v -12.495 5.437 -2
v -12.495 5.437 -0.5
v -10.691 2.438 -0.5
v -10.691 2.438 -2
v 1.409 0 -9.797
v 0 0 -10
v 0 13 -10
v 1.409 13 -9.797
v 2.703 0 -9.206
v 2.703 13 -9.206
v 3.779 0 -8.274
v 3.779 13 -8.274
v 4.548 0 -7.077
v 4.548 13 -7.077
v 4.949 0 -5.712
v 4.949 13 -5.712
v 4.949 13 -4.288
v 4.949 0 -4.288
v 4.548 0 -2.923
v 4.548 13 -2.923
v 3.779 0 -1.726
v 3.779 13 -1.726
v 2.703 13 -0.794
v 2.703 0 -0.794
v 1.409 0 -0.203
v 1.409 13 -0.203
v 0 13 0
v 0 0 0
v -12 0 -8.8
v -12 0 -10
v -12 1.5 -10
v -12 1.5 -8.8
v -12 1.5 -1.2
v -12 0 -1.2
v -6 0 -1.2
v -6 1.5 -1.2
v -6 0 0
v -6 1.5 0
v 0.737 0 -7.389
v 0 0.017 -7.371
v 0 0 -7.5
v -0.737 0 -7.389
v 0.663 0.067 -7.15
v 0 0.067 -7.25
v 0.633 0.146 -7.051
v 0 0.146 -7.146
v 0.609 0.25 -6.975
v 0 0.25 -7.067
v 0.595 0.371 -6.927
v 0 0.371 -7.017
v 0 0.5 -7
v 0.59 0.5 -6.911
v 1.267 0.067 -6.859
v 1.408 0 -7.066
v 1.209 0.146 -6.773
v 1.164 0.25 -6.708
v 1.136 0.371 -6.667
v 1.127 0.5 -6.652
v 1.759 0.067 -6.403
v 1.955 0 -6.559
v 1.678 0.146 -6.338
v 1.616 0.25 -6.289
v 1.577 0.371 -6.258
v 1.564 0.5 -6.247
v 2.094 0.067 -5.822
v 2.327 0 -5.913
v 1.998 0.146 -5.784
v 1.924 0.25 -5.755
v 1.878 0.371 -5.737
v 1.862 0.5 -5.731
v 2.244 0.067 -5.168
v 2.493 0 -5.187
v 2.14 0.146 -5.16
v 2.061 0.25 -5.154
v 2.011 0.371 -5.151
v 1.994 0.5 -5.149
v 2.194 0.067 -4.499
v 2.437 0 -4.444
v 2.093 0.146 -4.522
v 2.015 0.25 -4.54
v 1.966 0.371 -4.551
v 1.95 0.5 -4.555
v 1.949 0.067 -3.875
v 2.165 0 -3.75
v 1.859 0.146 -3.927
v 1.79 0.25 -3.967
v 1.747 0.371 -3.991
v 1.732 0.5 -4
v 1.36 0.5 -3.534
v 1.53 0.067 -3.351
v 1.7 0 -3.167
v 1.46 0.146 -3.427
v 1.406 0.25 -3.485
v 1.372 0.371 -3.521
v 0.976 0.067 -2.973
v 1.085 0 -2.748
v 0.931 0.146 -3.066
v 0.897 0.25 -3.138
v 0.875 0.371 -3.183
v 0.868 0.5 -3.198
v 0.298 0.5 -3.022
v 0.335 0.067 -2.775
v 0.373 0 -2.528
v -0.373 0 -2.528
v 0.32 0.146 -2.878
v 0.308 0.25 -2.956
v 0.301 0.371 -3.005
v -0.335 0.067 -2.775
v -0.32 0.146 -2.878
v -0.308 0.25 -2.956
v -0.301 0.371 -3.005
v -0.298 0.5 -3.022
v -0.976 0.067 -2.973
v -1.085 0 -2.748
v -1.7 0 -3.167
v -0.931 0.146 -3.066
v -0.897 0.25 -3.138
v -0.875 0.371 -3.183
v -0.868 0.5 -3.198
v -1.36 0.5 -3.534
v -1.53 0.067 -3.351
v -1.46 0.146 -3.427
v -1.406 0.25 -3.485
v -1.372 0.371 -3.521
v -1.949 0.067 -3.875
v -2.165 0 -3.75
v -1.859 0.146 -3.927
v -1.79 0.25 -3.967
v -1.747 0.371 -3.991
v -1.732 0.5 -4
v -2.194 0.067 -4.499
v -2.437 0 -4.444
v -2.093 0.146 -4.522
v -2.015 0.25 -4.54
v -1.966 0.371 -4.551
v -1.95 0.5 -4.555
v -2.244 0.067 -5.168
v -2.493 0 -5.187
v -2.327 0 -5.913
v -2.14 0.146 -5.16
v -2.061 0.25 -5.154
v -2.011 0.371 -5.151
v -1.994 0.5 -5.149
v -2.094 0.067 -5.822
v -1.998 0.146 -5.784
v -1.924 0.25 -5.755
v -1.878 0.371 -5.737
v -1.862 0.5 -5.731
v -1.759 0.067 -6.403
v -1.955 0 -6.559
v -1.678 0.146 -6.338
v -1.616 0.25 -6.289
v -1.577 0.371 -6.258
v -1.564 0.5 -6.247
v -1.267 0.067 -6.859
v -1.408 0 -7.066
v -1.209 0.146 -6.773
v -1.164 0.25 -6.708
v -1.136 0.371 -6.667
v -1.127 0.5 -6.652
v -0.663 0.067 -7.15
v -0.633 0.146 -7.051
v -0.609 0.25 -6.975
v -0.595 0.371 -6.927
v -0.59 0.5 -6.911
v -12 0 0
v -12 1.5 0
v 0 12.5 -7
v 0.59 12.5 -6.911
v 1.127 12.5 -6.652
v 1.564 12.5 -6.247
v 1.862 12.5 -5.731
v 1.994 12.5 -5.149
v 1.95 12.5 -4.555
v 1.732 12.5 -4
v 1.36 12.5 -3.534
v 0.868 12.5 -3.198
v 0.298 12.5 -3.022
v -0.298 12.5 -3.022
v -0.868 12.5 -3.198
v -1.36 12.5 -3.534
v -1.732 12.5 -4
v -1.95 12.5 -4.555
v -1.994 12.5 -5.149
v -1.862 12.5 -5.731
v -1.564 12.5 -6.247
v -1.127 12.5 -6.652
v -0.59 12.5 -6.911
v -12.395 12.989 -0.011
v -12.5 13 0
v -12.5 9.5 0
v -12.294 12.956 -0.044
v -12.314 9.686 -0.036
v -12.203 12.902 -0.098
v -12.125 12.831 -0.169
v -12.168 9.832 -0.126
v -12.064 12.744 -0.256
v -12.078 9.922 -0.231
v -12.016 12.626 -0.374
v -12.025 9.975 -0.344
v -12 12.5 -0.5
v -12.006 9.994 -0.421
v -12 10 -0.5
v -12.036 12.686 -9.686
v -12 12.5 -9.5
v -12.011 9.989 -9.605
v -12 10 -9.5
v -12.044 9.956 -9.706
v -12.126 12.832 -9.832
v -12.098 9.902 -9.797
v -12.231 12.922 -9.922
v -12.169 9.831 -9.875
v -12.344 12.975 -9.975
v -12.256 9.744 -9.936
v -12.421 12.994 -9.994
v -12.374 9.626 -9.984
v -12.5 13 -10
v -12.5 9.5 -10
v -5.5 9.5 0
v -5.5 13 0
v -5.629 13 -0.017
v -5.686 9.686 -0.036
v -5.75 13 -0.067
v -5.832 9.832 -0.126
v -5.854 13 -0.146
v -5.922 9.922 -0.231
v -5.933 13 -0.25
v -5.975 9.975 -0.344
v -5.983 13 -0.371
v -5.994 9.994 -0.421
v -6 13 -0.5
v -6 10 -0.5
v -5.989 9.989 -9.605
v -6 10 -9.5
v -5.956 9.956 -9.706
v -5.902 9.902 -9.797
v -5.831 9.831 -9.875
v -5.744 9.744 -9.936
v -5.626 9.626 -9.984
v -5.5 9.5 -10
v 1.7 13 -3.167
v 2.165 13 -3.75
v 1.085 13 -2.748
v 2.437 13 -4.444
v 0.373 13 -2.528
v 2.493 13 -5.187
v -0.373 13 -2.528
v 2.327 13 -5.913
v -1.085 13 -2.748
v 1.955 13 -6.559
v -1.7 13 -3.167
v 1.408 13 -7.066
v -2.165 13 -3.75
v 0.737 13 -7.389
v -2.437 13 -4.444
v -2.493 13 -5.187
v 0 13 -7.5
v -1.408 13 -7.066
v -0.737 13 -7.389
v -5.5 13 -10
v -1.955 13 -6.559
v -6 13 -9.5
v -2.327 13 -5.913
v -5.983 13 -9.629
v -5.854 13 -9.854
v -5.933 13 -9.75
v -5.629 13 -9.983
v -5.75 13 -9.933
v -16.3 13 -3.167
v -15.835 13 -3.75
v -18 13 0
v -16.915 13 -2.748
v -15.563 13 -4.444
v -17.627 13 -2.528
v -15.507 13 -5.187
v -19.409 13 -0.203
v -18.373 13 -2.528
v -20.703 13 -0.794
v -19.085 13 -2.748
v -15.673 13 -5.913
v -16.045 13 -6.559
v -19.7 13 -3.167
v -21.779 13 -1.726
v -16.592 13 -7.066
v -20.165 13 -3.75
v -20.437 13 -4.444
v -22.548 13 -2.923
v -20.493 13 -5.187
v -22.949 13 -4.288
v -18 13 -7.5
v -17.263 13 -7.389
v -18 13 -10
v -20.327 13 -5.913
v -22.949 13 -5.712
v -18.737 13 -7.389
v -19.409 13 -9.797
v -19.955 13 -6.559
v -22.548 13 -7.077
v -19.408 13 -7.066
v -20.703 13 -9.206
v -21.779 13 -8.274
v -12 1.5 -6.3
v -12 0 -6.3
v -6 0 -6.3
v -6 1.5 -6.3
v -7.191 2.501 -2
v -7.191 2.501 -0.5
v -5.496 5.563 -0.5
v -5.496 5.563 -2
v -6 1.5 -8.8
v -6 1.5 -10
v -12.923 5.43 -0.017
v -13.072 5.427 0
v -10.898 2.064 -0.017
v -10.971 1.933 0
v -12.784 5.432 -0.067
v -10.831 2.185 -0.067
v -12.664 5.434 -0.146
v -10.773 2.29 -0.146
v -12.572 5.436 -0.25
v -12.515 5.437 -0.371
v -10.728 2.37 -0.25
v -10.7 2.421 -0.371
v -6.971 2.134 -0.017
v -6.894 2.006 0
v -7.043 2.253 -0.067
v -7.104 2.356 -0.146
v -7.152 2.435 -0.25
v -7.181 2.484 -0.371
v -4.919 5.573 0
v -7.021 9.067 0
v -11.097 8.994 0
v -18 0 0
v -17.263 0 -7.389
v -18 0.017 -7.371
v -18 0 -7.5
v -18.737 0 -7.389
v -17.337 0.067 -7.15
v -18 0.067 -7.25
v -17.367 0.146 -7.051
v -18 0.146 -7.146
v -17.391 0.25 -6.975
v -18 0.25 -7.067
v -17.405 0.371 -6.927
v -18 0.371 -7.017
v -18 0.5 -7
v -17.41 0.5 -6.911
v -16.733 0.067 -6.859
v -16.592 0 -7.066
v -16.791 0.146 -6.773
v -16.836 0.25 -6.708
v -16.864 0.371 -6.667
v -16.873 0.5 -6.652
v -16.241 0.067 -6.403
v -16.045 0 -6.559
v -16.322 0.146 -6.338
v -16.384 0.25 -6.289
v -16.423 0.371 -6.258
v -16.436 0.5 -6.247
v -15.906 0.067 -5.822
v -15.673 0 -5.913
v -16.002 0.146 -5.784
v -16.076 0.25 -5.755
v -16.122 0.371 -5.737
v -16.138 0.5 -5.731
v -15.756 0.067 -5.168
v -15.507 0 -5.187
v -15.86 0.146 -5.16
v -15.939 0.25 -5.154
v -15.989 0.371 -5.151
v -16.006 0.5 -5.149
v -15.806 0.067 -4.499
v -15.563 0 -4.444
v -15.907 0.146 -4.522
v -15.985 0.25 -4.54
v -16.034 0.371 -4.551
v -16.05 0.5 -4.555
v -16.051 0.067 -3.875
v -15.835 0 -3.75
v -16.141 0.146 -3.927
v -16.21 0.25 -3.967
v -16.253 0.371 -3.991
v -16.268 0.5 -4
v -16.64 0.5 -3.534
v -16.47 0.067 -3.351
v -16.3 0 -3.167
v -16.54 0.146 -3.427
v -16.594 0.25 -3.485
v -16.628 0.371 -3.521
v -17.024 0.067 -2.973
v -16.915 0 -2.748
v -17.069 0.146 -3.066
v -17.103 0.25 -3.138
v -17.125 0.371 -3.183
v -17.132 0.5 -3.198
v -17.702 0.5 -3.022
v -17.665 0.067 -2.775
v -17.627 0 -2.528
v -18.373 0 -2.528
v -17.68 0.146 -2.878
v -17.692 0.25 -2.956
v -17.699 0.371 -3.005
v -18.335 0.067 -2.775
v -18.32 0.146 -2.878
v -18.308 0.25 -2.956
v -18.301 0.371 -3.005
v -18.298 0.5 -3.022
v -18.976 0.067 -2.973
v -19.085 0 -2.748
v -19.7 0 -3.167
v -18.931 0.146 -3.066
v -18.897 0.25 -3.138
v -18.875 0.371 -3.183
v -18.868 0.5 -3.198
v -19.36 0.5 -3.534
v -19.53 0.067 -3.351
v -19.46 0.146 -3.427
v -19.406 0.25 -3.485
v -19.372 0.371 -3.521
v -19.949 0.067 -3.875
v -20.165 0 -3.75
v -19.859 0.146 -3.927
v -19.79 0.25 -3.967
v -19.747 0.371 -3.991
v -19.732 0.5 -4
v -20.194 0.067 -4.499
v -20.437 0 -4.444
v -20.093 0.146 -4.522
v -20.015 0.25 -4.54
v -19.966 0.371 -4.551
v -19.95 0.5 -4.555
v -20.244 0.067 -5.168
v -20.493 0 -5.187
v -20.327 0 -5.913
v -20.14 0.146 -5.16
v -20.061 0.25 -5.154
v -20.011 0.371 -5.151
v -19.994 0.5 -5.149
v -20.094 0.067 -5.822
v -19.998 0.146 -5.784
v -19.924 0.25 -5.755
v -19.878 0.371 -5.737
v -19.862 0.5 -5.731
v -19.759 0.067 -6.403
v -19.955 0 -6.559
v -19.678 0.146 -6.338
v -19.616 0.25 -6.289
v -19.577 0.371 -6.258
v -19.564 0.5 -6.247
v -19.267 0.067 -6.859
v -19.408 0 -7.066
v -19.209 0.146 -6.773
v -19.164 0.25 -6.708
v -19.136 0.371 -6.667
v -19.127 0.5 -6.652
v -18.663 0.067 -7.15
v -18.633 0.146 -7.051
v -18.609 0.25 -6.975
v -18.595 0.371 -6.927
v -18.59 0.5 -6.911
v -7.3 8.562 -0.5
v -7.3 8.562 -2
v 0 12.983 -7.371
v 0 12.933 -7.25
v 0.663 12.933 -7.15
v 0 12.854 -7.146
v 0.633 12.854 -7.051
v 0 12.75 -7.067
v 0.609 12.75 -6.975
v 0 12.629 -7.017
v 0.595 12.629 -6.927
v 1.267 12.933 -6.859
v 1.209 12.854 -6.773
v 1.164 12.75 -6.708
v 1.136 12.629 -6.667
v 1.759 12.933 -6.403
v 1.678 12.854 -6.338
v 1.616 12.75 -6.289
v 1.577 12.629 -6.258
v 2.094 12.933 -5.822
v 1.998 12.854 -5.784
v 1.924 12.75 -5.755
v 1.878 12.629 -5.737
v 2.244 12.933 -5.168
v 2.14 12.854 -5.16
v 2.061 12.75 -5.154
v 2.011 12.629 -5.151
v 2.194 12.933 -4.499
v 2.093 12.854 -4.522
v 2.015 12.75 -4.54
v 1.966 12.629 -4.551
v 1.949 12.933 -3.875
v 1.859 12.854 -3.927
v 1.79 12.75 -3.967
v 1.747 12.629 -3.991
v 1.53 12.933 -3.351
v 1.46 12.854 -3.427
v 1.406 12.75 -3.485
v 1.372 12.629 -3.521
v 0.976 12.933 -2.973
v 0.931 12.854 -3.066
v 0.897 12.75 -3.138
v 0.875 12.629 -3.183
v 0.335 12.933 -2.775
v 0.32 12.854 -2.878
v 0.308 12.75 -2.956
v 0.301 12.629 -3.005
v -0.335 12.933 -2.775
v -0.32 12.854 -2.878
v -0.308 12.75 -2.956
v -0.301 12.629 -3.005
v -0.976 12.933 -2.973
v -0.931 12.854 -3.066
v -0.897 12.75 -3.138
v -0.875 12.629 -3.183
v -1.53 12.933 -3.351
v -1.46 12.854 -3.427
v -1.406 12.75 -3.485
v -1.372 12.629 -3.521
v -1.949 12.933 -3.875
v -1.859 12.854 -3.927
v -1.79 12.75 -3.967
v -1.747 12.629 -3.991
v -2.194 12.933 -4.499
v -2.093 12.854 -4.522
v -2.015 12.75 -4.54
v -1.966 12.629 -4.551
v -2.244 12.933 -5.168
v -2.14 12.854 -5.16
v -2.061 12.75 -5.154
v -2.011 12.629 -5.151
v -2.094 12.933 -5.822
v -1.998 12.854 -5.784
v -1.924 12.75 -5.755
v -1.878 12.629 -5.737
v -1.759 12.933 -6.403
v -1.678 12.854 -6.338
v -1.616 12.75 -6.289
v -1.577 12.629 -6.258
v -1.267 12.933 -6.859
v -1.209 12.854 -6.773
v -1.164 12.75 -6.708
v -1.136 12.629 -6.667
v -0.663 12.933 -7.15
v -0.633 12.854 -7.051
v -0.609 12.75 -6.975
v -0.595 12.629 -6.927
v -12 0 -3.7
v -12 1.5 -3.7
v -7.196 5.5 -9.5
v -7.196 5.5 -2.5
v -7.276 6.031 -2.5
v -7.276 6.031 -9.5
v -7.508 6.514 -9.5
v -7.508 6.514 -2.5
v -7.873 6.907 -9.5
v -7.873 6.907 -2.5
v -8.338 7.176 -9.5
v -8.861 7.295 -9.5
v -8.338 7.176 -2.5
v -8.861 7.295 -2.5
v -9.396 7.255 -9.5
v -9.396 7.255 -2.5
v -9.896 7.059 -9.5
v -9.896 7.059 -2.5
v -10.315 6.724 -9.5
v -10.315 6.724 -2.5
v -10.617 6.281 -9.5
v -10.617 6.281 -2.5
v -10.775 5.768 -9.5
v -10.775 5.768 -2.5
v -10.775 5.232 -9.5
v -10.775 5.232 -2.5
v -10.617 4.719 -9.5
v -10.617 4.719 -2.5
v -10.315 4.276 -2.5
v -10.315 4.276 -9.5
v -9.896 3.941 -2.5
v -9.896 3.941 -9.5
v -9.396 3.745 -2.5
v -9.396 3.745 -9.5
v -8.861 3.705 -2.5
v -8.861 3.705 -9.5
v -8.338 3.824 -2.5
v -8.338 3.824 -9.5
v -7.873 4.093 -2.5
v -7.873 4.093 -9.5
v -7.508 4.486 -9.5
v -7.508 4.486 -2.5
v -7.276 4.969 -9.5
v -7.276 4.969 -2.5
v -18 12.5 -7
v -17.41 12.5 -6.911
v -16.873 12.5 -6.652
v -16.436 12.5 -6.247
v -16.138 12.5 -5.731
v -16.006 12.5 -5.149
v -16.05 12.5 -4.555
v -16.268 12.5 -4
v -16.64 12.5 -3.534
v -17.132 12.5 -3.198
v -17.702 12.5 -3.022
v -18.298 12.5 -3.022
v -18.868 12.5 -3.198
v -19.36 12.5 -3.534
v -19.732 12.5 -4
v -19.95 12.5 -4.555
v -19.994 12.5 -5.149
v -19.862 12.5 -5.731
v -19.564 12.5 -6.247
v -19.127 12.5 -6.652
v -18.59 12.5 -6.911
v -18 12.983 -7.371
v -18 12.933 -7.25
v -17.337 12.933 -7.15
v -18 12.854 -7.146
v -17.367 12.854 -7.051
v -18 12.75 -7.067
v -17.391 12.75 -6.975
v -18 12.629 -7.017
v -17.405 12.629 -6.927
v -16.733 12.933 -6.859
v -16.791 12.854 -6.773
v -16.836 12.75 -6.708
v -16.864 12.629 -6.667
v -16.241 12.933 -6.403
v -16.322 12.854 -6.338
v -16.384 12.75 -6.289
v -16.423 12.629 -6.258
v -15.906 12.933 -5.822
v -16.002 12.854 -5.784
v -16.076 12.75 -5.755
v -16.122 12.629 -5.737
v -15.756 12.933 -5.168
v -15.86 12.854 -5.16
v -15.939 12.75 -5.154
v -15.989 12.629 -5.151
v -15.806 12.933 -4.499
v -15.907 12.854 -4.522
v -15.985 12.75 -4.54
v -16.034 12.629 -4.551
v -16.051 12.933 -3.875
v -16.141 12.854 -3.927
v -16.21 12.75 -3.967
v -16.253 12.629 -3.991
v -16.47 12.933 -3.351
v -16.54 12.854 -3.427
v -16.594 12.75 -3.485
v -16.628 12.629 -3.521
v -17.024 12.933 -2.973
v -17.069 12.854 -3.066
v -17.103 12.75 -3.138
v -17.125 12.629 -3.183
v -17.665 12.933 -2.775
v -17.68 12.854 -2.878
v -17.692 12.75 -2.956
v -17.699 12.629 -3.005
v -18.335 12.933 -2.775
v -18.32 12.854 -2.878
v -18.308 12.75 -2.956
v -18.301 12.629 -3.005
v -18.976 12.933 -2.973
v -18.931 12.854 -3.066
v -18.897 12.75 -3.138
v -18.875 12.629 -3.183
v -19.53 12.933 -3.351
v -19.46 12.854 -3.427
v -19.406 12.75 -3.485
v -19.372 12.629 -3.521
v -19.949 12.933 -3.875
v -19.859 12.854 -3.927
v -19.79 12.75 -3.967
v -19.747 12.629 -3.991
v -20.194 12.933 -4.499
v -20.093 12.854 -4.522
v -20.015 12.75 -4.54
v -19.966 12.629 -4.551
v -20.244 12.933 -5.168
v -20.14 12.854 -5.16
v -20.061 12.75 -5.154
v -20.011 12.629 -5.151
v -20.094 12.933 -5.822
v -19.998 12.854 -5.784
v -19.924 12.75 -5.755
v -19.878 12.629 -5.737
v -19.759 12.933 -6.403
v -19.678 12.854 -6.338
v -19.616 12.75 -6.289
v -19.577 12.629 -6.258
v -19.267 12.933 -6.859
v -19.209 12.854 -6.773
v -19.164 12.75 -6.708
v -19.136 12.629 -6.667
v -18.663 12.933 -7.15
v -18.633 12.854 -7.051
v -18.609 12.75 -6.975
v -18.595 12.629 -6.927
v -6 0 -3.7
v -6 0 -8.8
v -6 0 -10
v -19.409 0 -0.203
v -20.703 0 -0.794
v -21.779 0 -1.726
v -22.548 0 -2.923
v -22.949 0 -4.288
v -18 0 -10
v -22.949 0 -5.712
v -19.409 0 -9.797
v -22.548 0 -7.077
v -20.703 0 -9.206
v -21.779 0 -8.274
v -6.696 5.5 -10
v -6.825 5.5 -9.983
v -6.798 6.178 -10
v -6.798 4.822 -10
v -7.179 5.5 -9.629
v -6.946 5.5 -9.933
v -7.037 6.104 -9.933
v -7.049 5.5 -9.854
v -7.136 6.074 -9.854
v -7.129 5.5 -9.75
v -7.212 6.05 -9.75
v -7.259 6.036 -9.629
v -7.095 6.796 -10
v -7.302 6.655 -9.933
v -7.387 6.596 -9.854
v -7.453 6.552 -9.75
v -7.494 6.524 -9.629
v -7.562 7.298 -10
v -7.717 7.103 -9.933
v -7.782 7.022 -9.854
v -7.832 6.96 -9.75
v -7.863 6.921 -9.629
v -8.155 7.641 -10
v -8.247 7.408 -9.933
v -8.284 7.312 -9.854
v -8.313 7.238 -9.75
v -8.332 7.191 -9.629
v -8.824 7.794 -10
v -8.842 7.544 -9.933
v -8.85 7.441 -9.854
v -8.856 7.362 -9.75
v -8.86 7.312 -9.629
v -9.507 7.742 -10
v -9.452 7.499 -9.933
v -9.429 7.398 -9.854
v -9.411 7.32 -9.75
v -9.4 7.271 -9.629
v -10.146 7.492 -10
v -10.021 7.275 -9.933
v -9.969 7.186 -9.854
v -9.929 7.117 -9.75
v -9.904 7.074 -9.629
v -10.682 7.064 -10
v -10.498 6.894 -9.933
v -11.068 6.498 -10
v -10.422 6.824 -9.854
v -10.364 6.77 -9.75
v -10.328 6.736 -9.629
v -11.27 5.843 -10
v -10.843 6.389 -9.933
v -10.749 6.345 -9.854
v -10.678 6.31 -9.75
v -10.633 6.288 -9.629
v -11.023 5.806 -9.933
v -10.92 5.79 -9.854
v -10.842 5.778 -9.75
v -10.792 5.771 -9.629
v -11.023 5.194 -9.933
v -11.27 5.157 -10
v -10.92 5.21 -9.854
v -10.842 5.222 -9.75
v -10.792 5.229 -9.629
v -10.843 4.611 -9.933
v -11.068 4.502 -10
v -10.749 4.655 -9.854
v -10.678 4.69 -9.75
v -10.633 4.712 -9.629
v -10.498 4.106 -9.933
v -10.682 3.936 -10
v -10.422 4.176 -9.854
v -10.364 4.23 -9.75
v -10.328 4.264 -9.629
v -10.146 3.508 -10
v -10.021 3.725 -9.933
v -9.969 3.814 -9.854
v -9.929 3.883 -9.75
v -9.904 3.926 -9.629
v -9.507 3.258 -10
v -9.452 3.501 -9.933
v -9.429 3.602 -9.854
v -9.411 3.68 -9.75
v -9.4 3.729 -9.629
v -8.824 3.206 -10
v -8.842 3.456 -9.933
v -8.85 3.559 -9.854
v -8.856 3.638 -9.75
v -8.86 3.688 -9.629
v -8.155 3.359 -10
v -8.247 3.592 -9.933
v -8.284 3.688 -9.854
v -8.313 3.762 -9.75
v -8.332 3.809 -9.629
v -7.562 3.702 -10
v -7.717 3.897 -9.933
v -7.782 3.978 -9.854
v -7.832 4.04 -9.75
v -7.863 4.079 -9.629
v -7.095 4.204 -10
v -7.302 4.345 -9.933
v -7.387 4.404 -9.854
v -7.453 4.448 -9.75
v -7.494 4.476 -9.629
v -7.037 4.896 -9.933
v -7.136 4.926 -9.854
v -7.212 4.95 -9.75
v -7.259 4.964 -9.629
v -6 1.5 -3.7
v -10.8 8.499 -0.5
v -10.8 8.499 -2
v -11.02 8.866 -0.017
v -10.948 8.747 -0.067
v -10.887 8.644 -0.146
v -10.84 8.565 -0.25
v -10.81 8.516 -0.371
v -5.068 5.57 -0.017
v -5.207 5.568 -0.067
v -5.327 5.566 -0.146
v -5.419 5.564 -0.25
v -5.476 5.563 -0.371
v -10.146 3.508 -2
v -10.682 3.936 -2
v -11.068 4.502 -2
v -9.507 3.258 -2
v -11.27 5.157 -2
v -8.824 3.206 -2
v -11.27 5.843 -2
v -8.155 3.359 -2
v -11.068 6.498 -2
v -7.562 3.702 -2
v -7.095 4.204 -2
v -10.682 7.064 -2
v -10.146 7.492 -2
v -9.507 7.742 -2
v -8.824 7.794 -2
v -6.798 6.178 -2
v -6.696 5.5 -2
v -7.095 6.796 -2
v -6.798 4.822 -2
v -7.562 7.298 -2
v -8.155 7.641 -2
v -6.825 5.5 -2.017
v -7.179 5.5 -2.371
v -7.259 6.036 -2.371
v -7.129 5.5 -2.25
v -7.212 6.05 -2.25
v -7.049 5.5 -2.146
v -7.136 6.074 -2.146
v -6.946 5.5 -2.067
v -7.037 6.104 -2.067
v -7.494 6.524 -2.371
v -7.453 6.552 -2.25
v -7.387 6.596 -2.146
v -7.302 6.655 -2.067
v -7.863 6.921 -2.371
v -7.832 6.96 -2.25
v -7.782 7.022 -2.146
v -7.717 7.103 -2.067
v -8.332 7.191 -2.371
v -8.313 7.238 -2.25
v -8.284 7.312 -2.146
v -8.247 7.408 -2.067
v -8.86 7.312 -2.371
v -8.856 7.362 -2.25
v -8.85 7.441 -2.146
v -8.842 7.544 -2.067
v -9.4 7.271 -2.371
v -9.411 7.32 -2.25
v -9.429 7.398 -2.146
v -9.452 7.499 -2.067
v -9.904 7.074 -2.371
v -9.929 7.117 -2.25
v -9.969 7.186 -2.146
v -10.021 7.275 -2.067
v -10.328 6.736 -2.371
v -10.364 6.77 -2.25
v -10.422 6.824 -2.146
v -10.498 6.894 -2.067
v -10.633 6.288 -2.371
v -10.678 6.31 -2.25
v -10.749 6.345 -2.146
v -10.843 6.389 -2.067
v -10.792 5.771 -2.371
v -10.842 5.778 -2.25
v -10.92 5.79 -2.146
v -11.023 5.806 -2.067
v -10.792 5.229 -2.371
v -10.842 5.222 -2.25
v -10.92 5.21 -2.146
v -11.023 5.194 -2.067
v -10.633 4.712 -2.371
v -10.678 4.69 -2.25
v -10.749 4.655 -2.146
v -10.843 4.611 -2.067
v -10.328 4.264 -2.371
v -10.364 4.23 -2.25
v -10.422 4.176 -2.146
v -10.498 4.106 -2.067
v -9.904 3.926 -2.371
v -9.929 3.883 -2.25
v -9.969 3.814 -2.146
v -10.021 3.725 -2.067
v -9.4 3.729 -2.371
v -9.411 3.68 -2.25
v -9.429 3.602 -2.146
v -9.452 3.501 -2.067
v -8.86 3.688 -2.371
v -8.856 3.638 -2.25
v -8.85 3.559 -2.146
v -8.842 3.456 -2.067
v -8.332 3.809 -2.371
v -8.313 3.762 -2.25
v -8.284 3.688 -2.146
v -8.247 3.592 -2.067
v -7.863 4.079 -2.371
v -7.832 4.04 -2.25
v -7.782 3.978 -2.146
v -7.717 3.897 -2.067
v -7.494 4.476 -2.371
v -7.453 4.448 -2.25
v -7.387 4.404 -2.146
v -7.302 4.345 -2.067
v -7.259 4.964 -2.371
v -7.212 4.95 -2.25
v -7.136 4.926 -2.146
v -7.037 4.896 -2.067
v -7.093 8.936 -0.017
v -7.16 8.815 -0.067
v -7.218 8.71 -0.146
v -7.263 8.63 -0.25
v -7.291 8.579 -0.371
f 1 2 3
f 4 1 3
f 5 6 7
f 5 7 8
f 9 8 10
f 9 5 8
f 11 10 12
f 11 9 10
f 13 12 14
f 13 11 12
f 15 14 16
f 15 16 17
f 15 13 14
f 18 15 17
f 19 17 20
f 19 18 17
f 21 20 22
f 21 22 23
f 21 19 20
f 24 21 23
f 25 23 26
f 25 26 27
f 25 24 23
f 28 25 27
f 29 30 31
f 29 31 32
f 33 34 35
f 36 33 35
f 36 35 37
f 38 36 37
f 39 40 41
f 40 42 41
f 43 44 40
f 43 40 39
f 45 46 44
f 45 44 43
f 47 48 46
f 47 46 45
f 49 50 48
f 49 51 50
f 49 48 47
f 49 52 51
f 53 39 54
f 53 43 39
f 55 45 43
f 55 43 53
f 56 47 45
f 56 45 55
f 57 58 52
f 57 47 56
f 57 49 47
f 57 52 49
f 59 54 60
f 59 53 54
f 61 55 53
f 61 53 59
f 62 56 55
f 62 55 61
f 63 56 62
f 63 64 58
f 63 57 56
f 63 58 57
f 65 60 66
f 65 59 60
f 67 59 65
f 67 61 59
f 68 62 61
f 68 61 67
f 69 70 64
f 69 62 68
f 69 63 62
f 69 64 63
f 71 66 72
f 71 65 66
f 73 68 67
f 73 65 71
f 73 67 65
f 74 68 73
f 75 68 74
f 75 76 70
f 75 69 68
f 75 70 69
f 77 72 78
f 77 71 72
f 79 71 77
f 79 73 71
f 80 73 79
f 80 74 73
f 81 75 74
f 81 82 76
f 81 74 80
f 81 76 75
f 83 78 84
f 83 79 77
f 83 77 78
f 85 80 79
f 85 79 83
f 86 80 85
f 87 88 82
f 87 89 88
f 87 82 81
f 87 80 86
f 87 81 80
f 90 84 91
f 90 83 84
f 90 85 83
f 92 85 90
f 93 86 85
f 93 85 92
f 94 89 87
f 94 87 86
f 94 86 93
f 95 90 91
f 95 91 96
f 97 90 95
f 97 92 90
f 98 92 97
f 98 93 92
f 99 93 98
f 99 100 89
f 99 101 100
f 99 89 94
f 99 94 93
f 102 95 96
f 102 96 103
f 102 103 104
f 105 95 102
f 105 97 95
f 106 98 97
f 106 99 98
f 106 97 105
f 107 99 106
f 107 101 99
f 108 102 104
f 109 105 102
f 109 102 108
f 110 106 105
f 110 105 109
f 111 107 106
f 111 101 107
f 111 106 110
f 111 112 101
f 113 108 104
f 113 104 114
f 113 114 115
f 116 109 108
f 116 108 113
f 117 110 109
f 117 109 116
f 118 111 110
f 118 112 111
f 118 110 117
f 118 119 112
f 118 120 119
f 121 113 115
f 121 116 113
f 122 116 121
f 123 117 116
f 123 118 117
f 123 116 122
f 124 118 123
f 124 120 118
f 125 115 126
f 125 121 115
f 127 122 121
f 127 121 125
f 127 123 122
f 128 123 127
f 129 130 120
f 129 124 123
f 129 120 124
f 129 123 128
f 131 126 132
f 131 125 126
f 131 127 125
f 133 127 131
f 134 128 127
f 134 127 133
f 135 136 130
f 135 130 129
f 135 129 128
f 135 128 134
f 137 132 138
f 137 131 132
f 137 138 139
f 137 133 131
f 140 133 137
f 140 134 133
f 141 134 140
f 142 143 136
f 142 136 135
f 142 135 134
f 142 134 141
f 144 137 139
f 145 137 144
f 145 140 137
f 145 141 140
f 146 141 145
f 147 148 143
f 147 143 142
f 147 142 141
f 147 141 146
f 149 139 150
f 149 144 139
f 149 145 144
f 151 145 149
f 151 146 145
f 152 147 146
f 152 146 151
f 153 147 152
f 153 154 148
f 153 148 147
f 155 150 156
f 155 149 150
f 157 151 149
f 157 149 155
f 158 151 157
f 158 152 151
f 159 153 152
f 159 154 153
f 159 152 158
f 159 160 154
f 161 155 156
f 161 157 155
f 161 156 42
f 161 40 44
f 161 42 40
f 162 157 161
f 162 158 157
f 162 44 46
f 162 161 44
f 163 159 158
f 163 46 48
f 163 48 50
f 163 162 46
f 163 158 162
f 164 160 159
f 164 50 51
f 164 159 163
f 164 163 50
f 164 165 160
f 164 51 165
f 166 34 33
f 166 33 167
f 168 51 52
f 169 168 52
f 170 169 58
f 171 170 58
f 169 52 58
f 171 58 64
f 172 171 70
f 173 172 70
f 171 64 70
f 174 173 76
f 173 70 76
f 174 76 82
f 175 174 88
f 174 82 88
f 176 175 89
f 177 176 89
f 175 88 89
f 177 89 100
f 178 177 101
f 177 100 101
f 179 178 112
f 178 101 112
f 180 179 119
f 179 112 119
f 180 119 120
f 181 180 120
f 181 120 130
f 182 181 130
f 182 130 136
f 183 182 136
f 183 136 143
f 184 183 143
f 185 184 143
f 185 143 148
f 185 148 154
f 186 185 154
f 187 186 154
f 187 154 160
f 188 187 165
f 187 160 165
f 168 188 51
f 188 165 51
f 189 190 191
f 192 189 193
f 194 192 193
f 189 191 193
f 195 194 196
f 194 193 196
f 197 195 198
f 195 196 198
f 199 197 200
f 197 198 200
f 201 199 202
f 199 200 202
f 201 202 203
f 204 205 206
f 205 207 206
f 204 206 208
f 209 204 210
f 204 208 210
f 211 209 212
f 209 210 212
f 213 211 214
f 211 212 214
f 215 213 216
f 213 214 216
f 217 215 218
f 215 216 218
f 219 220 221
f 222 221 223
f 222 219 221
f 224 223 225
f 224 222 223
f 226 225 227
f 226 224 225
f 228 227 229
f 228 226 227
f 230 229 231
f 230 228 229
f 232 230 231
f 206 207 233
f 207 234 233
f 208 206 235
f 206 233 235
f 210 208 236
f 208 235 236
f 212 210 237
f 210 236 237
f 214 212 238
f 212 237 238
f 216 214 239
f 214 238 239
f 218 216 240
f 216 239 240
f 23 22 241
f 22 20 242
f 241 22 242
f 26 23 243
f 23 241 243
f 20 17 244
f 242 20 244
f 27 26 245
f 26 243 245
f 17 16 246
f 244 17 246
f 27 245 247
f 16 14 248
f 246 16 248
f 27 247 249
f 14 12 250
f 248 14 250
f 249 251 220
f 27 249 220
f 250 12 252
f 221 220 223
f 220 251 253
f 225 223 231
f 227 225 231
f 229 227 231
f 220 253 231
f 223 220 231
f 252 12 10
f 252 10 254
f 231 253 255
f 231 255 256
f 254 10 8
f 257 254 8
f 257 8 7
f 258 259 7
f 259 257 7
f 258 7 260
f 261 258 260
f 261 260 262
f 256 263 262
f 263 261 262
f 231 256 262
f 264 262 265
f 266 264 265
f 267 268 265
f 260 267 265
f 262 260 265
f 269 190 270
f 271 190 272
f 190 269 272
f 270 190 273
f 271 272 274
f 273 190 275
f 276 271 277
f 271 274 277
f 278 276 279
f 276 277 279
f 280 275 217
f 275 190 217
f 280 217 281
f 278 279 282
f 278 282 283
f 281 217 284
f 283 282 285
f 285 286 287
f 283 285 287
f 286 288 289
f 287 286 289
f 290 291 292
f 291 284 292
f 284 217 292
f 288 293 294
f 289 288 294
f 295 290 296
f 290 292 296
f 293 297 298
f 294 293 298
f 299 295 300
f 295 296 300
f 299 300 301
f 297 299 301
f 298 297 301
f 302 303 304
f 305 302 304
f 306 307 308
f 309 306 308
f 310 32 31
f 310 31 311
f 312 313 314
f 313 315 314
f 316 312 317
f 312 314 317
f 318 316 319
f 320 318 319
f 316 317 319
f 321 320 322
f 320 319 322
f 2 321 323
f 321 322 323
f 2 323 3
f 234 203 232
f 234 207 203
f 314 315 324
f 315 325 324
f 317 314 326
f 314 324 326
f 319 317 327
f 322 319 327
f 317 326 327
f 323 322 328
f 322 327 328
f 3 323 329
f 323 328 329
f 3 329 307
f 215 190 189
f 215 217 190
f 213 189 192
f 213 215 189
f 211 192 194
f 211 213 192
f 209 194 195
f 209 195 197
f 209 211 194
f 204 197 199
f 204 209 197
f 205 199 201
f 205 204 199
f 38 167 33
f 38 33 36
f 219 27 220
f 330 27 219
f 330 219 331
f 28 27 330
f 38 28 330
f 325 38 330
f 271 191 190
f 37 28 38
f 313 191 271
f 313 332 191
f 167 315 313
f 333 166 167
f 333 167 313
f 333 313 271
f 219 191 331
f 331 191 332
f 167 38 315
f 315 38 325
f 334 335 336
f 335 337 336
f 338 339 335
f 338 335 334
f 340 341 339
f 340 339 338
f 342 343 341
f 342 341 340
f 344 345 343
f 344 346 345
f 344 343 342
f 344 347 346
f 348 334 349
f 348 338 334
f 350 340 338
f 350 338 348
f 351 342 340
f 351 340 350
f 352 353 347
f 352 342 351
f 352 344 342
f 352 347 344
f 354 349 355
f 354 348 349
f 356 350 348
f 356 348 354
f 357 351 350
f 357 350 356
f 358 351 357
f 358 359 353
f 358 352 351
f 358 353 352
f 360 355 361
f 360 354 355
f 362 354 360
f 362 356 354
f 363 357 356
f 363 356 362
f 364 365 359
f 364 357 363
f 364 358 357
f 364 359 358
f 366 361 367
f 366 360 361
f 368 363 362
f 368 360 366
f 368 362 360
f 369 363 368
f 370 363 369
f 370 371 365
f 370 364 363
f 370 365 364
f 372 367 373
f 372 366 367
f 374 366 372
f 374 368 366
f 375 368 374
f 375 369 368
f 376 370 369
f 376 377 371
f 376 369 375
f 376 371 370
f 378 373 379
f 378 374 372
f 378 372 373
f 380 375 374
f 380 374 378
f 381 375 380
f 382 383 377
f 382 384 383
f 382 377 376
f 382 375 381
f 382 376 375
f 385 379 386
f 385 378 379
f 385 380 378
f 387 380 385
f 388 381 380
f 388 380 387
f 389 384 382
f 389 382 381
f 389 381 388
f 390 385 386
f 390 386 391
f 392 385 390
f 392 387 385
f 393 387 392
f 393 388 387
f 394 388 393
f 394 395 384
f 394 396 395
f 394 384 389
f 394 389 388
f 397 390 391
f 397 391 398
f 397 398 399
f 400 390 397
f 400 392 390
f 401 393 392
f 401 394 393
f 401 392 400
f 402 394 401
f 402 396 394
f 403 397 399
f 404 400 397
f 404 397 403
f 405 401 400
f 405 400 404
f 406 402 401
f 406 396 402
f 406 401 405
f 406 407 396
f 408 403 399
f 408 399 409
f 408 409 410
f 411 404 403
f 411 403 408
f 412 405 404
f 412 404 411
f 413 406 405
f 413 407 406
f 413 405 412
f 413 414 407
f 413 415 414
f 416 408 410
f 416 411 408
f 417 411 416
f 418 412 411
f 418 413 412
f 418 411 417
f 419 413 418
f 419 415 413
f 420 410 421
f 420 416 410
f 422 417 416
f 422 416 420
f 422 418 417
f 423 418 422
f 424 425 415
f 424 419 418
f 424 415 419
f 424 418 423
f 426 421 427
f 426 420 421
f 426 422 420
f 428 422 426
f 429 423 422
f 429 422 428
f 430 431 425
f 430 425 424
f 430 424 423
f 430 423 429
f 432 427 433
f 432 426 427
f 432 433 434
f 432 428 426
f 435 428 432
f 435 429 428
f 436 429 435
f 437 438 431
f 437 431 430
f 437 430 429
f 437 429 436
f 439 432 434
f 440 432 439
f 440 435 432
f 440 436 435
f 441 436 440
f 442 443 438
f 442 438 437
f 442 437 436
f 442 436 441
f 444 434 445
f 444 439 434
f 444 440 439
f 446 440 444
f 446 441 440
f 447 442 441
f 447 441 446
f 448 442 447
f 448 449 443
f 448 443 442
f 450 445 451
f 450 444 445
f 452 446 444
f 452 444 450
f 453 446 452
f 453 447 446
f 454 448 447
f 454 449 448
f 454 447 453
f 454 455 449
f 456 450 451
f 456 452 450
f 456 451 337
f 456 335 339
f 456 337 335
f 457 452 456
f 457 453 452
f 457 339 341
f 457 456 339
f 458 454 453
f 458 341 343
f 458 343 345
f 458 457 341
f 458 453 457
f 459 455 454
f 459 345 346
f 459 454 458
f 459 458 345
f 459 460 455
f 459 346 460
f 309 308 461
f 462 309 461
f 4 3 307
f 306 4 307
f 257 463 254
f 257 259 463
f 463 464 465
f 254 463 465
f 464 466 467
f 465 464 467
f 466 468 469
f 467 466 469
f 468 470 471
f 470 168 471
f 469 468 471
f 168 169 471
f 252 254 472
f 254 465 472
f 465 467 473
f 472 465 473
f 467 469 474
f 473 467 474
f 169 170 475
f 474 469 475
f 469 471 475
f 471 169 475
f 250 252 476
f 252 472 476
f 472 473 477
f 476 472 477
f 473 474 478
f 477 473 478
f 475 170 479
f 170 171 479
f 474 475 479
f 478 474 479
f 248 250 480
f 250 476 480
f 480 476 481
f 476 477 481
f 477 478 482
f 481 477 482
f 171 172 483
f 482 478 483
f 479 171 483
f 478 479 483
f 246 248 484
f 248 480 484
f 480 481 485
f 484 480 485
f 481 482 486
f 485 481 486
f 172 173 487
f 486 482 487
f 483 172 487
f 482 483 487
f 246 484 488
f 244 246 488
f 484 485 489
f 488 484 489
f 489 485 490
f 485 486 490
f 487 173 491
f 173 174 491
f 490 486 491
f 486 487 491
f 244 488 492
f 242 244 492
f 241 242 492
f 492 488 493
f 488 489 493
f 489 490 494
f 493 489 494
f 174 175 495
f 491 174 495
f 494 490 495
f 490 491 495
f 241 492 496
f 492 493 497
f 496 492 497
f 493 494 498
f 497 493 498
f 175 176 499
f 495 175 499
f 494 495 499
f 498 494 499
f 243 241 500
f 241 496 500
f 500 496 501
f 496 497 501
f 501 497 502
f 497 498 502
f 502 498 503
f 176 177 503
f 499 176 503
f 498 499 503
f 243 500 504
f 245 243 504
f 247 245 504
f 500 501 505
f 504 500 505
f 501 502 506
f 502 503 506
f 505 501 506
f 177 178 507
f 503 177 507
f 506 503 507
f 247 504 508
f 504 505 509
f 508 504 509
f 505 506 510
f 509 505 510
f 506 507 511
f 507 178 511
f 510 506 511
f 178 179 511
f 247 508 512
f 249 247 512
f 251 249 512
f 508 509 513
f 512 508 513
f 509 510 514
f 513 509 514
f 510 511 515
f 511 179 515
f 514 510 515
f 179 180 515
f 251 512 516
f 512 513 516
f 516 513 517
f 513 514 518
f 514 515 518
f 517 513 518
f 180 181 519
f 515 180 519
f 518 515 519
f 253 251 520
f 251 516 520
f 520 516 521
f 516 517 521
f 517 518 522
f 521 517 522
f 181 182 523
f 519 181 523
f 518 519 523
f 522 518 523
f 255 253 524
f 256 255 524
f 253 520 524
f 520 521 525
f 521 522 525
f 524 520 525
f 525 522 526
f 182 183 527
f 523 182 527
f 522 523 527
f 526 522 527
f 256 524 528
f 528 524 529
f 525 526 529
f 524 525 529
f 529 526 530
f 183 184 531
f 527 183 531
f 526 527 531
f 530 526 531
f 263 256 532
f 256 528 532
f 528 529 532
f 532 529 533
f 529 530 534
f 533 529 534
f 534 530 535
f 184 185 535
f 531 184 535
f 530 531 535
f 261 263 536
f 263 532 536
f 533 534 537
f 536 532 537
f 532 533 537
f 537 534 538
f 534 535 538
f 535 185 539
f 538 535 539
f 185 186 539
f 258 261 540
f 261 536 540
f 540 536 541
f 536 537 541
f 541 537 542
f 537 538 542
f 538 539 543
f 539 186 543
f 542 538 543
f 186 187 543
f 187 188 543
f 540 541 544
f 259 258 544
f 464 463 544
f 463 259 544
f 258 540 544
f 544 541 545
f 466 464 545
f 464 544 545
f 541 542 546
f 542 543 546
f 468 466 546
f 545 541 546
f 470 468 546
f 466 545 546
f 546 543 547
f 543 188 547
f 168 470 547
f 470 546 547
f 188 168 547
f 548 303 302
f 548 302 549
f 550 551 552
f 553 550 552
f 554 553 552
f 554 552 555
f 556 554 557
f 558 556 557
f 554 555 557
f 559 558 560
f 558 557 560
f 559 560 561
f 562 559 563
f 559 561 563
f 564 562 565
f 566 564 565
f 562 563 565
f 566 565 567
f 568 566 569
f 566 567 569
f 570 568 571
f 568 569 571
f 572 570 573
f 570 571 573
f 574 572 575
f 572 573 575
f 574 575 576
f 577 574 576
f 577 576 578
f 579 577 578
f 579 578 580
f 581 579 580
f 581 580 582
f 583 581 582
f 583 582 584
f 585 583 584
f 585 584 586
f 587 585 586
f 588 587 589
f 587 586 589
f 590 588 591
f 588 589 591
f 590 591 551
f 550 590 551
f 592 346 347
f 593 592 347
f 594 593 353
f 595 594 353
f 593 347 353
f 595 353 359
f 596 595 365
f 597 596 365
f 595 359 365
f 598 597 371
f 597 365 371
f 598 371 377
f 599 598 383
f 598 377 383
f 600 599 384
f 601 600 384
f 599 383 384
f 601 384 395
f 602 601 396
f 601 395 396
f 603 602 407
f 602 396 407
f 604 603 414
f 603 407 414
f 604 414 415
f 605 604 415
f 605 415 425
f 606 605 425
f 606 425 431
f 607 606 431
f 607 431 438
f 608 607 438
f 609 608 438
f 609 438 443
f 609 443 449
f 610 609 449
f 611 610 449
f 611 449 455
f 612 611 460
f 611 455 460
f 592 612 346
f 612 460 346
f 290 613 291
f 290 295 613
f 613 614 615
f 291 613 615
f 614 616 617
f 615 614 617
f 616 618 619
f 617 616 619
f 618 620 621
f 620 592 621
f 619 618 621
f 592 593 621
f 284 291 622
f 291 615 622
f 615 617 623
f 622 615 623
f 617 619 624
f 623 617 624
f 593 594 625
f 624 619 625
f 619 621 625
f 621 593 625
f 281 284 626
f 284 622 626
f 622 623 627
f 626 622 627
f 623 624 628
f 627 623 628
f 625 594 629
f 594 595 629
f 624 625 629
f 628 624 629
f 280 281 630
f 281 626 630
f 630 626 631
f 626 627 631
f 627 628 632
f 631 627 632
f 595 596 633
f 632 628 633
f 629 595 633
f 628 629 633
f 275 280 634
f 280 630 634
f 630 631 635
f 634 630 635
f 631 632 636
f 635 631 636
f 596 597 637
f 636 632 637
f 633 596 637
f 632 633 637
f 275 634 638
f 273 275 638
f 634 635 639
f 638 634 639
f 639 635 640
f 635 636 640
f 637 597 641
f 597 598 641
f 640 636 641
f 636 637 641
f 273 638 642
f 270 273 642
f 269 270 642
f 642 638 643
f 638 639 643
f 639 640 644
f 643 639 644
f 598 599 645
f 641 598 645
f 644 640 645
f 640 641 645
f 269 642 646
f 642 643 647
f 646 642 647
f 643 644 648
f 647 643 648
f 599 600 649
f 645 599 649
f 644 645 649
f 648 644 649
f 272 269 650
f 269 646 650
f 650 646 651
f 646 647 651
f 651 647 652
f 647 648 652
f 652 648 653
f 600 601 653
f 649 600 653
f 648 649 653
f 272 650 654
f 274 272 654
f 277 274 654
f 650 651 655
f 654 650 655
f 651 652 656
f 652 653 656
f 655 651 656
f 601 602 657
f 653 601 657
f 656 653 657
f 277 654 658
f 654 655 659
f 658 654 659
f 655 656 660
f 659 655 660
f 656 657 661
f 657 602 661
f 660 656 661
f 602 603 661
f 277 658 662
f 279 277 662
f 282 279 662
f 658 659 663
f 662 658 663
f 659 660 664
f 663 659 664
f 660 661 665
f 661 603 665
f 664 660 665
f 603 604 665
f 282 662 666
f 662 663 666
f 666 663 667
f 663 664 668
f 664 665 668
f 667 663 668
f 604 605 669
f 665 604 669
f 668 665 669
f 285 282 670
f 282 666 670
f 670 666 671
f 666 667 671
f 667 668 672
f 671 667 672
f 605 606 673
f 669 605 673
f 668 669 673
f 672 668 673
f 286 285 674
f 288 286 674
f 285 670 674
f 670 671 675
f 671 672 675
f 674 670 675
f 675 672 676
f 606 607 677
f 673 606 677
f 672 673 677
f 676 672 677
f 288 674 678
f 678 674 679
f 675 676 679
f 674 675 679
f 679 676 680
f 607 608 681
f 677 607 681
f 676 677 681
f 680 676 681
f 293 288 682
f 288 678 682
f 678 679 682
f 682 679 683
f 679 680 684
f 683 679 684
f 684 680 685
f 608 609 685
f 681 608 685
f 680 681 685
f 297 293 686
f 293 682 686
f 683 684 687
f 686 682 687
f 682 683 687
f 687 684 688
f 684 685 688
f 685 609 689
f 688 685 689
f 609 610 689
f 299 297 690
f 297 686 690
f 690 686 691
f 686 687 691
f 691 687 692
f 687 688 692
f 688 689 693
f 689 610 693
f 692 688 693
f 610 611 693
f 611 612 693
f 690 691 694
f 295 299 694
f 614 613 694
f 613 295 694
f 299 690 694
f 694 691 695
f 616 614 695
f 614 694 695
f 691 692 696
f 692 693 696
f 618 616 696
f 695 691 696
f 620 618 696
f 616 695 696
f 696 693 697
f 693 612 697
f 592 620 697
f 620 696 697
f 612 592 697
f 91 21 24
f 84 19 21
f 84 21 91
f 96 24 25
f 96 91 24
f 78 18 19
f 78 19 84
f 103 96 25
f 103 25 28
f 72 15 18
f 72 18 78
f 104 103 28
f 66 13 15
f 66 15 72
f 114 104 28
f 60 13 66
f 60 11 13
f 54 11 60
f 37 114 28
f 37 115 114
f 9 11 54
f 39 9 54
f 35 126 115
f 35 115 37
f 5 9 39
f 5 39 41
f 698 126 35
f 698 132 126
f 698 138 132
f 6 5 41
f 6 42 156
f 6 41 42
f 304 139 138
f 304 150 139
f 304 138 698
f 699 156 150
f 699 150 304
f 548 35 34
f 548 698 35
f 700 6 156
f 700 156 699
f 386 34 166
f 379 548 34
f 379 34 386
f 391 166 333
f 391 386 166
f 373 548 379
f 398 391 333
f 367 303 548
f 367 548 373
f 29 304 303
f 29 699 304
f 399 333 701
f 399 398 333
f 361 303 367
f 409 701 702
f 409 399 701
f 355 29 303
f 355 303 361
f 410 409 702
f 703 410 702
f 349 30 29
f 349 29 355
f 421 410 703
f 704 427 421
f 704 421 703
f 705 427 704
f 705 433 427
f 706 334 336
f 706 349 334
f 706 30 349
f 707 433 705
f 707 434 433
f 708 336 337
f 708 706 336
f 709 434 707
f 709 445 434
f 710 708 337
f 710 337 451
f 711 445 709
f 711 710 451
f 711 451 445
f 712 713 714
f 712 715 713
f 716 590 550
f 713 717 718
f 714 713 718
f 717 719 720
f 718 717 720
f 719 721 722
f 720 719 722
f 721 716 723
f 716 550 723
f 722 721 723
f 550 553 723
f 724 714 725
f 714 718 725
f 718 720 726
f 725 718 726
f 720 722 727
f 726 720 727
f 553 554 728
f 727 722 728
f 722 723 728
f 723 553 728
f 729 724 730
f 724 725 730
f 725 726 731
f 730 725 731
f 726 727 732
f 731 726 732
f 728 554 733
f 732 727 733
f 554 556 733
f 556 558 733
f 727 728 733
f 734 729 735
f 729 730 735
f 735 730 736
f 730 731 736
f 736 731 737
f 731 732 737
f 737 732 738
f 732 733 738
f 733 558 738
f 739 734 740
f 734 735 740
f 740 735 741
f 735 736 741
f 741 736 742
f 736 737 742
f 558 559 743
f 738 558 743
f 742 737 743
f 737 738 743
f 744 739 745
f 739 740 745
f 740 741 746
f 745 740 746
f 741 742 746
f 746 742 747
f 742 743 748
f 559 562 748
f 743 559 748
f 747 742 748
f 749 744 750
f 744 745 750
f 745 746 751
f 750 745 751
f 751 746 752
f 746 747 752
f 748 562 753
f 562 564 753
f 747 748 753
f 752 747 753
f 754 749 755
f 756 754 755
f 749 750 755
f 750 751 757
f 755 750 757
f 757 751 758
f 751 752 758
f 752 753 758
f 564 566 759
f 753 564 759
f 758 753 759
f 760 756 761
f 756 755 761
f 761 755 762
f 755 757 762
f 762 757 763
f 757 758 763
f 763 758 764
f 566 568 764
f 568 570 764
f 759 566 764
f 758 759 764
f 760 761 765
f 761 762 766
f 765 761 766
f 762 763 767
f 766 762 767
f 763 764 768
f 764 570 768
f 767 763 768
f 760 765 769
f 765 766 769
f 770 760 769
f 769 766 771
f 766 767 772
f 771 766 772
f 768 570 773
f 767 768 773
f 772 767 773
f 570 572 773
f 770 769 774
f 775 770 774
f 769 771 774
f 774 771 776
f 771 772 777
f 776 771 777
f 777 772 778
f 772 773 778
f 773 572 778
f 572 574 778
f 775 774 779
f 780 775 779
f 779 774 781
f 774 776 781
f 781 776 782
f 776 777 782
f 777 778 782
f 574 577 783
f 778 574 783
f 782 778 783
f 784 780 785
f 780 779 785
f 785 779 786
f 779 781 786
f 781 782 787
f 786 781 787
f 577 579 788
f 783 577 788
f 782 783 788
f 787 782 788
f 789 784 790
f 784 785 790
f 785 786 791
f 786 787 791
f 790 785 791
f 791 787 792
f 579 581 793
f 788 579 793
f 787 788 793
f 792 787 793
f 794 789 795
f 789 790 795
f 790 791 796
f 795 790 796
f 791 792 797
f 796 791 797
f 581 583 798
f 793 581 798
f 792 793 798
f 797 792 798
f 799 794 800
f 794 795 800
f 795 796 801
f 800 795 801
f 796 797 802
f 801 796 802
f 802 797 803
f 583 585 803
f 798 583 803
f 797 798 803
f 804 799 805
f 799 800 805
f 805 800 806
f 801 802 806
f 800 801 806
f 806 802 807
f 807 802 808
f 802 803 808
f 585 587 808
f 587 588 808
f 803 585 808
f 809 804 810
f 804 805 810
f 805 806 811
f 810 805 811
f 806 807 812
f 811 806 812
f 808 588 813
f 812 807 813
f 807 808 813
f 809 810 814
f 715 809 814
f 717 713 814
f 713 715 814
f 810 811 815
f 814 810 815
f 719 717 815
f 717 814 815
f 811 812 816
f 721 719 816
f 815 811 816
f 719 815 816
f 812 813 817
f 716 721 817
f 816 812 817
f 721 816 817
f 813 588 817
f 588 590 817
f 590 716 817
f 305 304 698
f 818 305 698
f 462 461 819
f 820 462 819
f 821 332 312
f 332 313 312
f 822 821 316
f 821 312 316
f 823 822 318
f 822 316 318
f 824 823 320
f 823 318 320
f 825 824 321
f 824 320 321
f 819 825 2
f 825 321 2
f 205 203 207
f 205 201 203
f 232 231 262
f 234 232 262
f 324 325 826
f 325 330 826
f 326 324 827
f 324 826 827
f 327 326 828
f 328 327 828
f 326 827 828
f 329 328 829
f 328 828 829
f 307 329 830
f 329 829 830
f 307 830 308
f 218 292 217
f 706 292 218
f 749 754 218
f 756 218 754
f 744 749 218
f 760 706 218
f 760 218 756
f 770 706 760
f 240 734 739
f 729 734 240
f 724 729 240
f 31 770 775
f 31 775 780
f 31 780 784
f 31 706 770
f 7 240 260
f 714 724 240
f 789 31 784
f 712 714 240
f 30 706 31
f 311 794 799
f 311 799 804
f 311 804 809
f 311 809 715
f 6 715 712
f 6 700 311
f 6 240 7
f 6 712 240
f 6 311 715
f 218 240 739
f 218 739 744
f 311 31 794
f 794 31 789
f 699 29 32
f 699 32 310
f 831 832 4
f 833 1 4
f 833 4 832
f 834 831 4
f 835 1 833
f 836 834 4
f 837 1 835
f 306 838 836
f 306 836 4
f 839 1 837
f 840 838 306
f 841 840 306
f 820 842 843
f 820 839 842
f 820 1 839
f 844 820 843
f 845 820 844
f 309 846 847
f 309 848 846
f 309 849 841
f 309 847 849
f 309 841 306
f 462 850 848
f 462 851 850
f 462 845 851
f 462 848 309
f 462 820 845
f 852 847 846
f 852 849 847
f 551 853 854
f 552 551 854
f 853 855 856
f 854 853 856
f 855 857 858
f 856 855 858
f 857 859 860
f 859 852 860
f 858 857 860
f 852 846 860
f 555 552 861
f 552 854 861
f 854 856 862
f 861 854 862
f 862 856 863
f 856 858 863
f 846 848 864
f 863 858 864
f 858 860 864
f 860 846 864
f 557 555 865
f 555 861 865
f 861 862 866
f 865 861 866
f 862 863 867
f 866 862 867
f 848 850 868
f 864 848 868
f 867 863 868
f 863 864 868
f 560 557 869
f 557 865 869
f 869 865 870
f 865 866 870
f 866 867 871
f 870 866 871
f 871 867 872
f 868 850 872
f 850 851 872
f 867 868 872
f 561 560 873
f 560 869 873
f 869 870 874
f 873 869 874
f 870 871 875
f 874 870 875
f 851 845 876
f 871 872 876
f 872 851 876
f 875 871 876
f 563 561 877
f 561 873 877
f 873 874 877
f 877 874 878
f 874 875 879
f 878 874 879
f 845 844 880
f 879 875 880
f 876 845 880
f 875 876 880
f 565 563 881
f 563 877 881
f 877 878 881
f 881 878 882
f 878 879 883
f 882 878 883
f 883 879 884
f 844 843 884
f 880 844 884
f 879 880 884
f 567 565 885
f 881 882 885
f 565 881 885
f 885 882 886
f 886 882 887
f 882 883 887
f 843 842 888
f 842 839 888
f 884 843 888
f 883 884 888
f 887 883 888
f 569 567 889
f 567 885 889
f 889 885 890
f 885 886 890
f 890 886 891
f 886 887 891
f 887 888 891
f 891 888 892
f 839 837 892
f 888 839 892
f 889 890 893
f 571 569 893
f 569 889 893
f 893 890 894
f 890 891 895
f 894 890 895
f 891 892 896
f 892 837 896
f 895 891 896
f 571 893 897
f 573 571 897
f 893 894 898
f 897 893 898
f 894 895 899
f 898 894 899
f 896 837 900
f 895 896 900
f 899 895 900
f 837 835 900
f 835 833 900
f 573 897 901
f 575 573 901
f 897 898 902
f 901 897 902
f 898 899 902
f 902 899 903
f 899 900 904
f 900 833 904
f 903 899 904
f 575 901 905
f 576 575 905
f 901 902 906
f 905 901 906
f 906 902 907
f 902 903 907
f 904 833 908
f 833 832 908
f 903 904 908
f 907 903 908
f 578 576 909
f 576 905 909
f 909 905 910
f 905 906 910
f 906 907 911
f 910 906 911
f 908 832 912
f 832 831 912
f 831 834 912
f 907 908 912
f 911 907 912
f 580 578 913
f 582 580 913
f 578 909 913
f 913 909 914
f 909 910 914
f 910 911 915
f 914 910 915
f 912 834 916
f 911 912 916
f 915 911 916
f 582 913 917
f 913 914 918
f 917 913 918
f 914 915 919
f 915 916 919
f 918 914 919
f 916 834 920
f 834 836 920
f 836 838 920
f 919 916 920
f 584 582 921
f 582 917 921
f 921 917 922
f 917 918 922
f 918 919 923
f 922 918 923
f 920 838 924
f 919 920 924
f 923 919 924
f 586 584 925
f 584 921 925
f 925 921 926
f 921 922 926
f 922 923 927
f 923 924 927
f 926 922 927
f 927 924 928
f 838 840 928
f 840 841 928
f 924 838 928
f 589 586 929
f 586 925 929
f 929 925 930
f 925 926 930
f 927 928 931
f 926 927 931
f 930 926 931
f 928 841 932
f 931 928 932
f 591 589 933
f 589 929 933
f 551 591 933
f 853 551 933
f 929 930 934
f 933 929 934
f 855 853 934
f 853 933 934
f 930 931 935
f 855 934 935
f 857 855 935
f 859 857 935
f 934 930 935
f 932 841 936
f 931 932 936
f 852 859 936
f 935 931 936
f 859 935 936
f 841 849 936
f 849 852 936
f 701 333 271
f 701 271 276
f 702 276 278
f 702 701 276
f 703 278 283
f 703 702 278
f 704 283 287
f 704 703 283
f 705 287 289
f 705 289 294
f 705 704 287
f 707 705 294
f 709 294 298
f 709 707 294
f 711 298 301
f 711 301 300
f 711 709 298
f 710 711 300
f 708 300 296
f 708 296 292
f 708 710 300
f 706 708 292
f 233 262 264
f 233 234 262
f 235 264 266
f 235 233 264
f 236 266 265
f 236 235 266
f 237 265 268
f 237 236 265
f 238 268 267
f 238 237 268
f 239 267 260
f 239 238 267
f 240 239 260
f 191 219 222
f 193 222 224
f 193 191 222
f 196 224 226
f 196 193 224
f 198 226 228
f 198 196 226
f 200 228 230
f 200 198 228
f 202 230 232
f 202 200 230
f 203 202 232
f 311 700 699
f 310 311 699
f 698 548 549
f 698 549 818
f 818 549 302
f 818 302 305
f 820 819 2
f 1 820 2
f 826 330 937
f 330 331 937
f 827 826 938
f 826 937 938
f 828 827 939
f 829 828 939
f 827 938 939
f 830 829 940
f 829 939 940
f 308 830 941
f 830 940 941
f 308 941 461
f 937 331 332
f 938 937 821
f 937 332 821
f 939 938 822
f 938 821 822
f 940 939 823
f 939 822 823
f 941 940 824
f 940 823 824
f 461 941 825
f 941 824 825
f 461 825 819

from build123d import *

# Parameters (mm, degrees)
BOSS_EXTRUDE2_DEPTH = 13
SCREW_HOLES_R       = 2
CUT_EXTRUDE1_DEPTH  = 13
FILLET1_R           = 0.5
BELT_OPENING_W      = 6
BELT_OPENING_H      = 10
CUT_EXTRUDE2_DEPTH  = 3
CUT_EXTRUDE3_DEPTH  = 2
STRETCHER_HOLE_R    = 1.8
CUT_EXTRUDE4_DEPTH  = 8
FILLET2_R           = 0.5
FILLET3_R           = 0.5
FILLET8_R           = 0.5
FILLET9_R           = 0.5
SKETCH1_W           = 6
SKETCH1_H           = 2.4
SKETCH1_H_2         = 2.6
CUT_EXTRUDE5_DEPTH  = 1.5


with BuildPart() as part:
    # Belt Clamp → Boss-Extrude2 (new body)
    with BuildSketch(Plane(origin=(0, 0, 0), x_dir=(1, 0, 0), z_dir=(0, 1, 0))):
        with BuildLine():
            Line((-18, 10), (0, 10))
            ThreePointArc((0, 10), (5, 5), (0, 0))
            Line((0, 0), (-18, 0))
            ThreePointArc((-18, 0), (-23, 5), (-18, 10))
        make_face()
    extrude(amount=BOSS_EXTRUDE2_DEPTH)

    # Screw Holes → Cut-Extrude1 (cut)
    with BuildSketch(Plane.XZ):
        with Locations(Location((0, -5, 0), (0, 0, 270))):
            Circle(SCREW_HOLES_R)
        with Locations(Location((-18, -5, 0), (0, 0, 270))):
            Circle(SCREW_HOLES_R)
    extrude(amount=-CUT_EXTRUDE1_DEPTH, mode=Mode.SUBTRACT)

    # Fillet1
    fillet1_edges = [part.edges().sort_by_distance(p)[0] for p in [
        (0, 0, -3),
        (0, 13, -3),
        (-18, 0, -3),
        (-18, 13, -3),
    ]]
    fillet(fillet1_edges, radius=FILLET1_R)

    # Belt Opening → Cut-Extrude2 (cut)
    with BuildSketch(Plane(origin=(0, 13, 0), x_dir=(1, 0, 0), z_dir=(0, 1, 0))):
        with Locations((-9, 5)):
            Rectangle(BELT_OPENING_W, BELT_OPENING_H)
    extrude(amount=-CUT_EXTRUDE2_DEPTH, mode=Mode.SUBTRACT)

    # Hex Nut → Cut-Extrude3 (cut)
    with BuildSketch(Plane.XY):
        Polygon((-12.494989746, 5.437207375), (-10.690891397, 2.438002623), (-7.191454715, 2.500795248), (-5.496116383, 5.562792625), (-7.300214732, 8.561997377), (-10.799651413, 8.499204752), align=None)
    extrude(amount=-CUT_EXTRUDE3_DEPTH, mode=Mode.SUBTRACT)

    # Stretcher Hole → Cut-Extrude4 (cut)
    with BuildSketch(Plane.XY.offset(-2)):
        with Locations((-8.995553064, 5.5)):
            Circle(STRETCHER_HOLE_R)
    extrude(amount=-CUT_EXTRUDE4_DEPTH, mode=Mode.SUBTRACT)

    # Fillet2
    fillet2_edges = [part.edges().sort_by_distance(p)[0] for p in [
        (-10.795553064, 5.5, -2),
        (-10.795553064, 5.5, -10),
    ]]
    fillet(fillet2_edges, radius=FILLET2_R)

    # Fillet3
    fillet3_edges = [part.edges().sort_by_distance(p)[0] for p in [
        (-11.64732058, 6.968206064, 0),
        (-11.592940571, 3.937604999, 0),
        (-8.941173056, 2.469398935, 0),
        (-6.343785549, 4.031793936, 0),
        (-6.398165558, 7.062395001, 0),
        (-9.049933073, 8.530601065, 0),
    ]]
    fillet(fillet3_edges, radius=FILLET3_R)

    # Fillet8
    fillet8_edges = [part.edges().sort_by_distance(p)[0] for p in [
        (-12, 11.5, 0),
        (-9, 10, -10),
        (-12, 11.5, -10),
        (-6, 11.5, -10),
        (-6, 11.5, 0),
        (-12, 13, -5),
    ]]
    fillet(fillet8_edges, radius=FILLET8_R)

    # Fillet9
    fillet9_edges = [part.edges().sort_by_distance(p)[0] for p in [
        (-9, 10, 0),
    ]]
    fillet(fillet9_edges, radius=FILLET9_R)

    # Sketch1 → Cut-Extrude5 (cut)
    with BuildSketch(Plane.XZ):
        with Locations((-9, 0)):
            Rectangle(SKETCH1_W, SKETCH1_H)
        with Locations((-9, -5)):
            Rectangle(SKETCH1_W, SKETCH1_H_2)
        with Locations((-9, -10)):
            Rectangle(SKETCH1_W, SKETCH1_H)
    extrude(amount=-CUT_EXTRUDE5_DEPTH, mode=Mode.SUBTRACT)


solid = part.part
